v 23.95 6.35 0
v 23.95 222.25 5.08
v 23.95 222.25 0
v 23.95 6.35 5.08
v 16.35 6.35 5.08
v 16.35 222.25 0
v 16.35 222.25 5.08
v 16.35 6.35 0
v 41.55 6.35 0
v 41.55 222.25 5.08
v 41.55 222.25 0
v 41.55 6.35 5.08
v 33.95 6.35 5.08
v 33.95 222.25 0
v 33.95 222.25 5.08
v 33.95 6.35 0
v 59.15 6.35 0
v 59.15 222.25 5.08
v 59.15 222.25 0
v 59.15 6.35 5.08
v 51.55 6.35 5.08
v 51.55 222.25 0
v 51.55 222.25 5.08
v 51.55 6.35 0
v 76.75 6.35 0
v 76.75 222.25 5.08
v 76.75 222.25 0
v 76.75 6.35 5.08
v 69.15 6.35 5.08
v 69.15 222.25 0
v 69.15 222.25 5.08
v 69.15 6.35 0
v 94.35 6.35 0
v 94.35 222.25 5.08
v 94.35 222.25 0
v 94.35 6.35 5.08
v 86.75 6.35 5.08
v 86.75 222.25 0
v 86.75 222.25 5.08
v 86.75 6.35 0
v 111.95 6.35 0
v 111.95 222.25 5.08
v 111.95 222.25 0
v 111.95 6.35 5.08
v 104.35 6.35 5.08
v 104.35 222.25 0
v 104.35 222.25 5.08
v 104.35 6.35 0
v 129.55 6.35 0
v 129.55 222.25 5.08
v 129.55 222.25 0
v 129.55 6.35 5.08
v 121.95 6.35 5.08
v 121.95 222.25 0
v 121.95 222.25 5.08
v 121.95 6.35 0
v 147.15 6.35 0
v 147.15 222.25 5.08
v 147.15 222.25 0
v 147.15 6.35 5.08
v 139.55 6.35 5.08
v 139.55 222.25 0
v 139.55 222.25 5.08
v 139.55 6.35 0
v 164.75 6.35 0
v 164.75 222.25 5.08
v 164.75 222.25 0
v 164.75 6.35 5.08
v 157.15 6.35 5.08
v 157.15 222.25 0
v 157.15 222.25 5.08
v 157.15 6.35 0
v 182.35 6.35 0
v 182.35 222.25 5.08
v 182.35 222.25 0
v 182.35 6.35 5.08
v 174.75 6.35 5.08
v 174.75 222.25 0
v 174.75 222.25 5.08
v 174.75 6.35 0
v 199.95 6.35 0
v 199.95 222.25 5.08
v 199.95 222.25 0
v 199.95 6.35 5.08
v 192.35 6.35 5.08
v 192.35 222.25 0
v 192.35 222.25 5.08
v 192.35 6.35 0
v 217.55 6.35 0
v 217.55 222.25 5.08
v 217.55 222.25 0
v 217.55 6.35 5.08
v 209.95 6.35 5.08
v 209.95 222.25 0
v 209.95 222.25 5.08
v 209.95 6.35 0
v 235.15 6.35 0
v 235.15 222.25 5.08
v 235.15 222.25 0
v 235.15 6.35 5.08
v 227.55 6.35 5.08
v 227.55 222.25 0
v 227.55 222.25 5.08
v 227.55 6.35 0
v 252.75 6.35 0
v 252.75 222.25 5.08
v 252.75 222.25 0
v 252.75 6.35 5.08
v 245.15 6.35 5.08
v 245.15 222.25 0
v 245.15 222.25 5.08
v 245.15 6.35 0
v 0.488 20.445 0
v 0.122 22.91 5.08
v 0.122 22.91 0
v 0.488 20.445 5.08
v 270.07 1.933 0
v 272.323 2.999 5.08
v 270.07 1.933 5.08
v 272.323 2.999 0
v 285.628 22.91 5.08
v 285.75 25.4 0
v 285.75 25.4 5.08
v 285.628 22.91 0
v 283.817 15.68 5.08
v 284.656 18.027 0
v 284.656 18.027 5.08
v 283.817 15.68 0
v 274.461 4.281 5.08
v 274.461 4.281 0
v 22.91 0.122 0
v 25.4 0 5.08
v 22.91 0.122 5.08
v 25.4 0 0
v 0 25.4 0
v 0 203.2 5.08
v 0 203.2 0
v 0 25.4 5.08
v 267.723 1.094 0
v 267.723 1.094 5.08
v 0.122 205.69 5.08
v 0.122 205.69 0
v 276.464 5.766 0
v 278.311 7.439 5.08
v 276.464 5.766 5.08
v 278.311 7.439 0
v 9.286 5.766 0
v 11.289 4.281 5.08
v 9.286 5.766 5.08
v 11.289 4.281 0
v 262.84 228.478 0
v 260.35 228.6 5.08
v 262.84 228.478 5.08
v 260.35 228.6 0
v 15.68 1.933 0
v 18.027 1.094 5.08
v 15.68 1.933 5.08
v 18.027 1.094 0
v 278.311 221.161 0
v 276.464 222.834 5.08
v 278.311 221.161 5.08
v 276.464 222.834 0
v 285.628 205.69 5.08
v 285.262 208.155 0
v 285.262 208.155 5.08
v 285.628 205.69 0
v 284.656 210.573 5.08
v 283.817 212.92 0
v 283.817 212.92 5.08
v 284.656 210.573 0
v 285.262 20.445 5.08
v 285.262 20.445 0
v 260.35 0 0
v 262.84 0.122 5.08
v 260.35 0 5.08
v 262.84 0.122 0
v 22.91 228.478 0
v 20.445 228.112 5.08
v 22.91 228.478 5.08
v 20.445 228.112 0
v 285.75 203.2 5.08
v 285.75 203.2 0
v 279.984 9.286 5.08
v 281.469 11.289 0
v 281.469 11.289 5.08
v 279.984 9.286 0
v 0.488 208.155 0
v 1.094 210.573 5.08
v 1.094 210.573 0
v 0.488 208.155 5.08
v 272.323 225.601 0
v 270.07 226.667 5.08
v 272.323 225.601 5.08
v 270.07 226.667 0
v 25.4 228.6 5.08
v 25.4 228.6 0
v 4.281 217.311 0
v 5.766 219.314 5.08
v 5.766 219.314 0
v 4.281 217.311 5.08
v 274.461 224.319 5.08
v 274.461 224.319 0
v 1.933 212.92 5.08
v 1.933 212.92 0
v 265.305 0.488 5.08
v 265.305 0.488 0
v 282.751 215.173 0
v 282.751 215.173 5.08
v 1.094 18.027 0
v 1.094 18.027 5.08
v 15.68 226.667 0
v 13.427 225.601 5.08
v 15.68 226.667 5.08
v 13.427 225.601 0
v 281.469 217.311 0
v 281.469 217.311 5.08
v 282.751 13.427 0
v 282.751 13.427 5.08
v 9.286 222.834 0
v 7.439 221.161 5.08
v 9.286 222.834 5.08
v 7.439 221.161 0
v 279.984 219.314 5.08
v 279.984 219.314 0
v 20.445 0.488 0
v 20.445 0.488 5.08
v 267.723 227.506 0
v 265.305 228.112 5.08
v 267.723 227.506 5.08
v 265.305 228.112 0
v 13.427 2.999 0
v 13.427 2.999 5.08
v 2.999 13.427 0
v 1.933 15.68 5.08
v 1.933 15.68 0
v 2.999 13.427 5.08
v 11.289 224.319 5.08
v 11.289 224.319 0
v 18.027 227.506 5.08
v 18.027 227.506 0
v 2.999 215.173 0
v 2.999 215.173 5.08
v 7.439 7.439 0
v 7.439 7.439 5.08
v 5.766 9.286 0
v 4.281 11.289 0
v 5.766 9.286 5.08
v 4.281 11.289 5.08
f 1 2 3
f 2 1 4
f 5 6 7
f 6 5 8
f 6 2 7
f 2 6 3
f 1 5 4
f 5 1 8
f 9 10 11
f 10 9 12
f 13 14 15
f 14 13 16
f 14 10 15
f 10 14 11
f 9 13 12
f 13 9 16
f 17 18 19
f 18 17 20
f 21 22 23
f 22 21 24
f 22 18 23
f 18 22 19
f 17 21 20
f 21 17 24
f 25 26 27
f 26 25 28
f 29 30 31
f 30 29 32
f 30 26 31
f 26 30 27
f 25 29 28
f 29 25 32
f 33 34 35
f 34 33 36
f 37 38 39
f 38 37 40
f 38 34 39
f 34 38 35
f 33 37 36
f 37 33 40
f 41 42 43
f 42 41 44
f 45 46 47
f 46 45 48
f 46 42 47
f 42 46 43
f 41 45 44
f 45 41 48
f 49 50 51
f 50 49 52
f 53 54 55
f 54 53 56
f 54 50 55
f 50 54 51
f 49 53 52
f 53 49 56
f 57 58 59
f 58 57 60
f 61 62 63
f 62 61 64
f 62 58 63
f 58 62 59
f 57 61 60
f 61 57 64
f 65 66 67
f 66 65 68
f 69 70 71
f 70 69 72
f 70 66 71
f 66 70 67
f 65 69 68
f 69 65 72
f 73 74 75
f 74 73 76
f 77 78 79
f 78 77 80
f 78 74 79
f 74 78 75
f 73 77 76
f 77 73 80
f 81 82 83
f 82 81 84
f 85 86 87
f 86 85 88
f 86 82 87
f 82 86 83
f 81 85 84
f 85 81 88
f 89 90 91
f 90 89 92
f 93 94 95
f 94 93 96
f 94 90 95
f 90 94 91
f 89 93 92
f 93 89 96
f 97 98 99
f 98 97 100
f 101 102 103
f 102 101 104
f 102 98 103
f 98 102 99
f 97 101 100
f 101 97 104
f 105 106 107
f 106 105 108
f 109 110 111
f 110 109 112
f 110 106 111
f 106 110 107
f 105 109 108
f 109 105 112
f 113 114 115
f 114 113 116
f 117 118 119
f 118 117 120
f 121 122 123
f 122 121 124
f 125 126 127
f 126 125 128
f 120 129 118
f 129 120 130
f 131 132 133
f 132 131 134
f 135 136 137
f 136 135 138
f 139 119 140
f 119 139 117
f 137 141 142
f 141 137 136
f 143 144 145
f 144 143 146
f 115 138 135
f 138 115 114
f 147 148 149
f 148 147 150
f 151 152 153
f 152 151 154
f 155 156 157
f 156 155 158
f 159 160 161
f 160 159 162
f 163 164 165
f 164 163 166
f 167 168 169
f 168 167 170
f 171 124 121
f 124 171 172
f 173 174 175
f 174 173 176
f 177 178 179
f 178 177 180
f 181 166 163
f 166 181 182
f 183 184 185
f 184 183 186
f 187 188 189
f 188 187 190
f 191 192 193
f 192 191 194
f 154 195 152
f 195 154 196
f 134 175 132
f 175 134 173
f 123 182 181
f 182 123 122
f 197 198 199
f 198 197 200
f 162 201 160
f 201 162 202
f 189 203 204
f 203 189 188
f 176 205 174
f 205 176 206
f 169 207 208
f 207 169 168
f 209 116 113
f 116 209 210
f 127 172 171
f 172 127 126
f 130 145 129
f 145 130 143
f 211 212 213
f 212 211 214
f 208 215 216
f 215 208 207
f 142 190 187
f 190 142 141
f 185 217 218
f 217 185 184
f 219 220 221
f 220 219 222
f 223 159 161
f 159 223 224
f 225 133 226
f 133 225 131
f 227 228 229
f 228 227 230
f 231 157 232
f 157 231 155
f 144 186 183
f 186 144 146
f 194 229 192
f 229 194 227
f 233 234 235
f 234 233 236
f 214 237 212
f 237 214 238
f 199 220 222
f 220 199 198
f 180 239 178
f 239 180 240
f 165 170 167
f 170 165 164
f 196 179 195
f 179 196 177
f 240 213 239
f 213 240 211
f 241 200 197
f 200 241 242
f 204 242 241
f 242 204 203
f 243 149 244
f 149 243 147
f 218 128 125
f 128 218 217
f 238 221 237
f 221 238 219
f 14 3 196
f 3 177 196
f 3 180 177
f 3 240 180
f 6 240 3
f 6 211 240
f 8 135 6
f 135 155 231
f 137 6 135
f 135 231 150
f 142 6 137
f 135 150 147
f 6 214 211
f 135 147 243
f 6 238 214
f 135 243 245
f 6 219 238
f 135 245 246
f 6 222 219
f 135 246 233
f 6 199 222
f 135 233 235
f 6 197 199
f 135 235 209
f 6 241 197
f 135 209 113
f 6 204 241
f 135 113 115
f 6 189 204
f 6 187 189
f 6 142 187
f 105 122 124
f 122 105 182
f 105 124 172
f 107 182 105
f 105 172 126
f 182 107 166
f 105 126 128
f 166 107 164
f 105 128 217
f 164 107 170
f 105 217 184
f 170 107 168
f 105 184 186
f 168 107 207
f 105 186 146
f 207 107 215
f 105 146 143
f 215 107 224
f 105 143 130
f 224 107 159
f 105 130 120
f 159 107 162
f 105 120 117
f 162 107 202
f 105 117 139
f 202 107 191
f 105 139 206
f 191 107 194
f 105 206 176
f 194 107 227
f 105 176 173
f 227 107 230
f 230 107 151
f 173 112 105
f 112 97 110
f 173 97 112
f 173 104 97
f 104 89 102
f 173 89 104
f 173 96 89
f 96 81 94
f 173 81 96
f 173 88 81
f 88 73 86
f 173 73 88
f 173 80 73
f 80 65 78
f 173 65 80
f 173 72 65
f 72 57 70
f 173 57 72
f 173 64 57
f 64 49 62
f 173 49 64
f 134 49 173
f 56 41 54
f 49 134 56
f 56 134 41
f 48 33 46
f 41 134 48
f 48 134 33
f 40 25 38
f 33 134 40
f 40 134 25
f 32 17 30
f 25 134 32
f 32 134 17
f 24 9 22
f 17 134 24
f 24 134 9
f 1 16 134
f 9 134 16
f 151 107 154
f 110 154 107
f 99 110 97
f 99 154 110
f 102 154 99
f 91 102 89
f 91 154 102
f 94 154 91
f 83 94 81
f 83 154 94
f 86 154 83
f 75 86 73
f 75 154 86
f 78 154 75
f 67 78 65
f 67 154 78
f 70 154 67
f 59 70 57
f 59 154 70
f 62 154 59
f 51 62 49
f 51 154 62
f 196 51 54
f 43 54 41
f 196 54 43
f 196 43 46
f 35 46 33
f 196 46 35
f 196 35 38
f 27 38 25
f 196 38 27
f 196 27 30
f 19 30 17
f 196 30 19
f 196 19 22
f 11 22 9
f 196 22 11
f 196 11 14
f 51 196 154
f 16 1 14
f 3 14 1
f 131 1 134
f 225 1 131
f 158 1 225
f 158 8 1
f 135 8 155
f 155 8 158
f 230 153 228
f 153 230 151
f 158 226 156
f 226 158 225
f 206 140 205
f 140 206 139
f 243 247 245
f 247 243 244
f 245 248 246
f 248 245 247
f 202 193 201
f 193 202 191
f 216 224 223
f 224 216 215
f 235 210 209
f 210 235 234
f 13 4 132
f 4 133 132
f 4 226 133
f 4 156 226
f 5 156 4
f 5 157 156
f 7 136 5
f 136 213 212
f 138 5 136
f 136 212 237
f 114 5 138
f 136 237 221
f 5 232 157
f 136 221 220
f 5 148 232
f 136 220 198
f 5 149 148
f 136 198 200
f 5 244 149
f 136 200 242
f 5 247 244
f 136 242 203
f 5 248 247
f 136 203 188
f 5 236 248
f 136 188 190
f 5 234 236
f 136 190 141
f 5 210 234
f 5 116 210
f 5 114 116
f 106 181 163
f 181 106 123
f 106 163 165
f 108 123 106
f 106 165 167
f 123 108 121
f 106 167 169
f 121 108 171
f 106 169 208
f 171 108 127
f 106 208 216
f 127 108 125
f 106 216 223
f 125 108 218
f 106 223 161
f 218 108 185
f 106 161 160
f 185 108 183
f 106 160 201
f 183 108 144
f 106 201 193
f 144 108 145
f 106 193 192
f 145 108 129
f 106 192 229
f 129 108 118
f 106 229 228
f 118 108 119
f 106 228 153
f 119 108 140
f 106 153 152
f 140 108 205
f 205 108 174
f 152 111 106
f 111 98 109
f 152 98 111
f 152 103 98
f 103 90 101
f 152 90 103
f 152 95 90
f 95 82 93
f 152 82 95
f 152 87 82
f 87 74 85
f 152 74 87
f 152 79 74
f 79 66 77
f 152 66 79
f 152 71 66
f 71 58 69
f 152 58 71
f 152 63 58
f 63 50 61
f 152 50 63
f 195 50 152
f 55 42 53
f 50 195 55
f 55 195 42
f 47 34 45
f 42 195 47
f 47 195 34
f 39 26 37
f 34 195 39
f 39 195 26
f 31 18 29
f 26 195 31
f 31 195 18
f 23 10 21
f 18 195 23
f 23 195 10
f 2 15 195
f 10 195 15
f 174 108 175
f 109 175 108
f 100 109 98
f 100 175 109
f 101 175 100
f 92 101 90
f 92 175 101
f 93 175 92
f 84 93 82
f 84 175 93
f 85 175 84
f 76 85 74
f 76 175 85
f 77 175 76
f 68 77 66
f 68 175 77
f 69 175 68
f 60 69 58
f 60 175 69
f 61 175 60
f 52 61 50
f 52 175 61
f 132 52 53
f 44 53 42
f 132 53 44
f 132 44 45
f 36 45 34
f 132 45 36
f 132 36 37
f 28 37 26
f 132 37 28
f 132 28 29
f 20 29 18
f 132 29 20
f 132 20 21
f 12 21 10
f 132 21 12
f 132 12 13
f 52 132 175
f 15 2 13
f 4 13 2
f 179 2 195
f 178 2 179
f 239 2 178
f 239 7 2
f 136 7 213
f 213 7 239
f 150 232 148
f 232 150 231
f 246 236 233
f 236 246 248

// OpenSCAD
// file: model-forge/model-forge/tray.scad
// model-forge/tray.scad — rounded-corner outer panel with a recessed
// inset pocket (e.g. a "cooking dish" recess): a raised rim around the
// edge, floor thickness under the pocket, and an optional thin lip
// flange around the base — sized to slide into a support-rail groove
// (like the wooden rails inside the real Tiny Land oven cavity) rather
// than just resting loose.
//
//   use <model-forge/tray.scad>
//   rounded_tray(outer_width=285.75, outer_height=228.6, corner_radius=25.4,
//                floor_thickness=5.08, rim_height=3.81, inset_margin=6.35,
//                lip_width=3, lip_thickness=2);
//
// Shape: outer_width x outer_height slab, rounded corners (corner_radius),
// total height = floor_thickness + rim_height. A pocket is cut from the
// top, inset_margin in from every edge, cutting down through rim_height
// and stopping at floor_thickness from the bottom — so floor_thickness is
// what's left under the pocket, rim_height is how tall the surrounding
// wall stands above the pocket floor.
//
// The lip (lip_width/lip_thickness) is a thin flange at the TOP of the
// rim (from total_height-lip_thickness to total_height), sticking out
// lip_width beyond the main body on every side — corrected 2026-09-11
// per feedback on the real rail photo: the groove is near the top of the
// cavity wall, not the bottom. Both default to 0 (no lip) so existing
// calls keep working unchanged.

// hull-of-4-circles rounded rect — much faster to render than a
// minkowski-based approach for this shape (no minkowski sum needed).
module rounded_rect_2d(w, h, r) {
  hull() {
    translate([r, r]) circle(r = r, $fn = 64);
    translate([w - r, r]) circle(r = r, $fn = 64);
    translate([r, h - r]) circle(r = r, $fn = 64);
    translate([w - r, h - r]) circle(r = r, $fn = 64);
  }
}

module rounded_tray(
  outer_width,
  outer_height,
  corner_radius,
  floor_thickness,
  rim_height,
  inset_margin,
  lip_width = 0,
  lip_thickness = 0
) {
  total_height = floor_thickness + rim_height;

  union() {
    if (lip_width > 0 && lip_thickness > 0) {
      translate([-lip_width, -lip_width, total_height - lip_thickness])
        linear_extrude(height = lip_thickness)
          rounded_rect_2d(outer_width + 2 * lip_width, outer_height + 2 * lip_width, corner_radius + lip_width);
    }
    difference() {
      linear_extrude(height = total_height)
        rounded_rect_2d(outer_width, outer_height, corner_radius);
      translate([inset_margin, inset_margin, floor_thickness])
        cube([outer_width - 2 * inset_margin, outer_height - 2 * inset_margin, rim_height + 1]);
    }
  }
}
// file: model-forge/grate.scad
// model-forge/grate.scad — rounded-corner panel cut into an oven-rack-
// style bar grate: a solid frame border, parallel bars across the
// interior with open gaps between them.
//
//   use <model-forge/grate.scad>
//   oven_grate(outer_width=285.75, outer_height=228.6, corner_radius=25.4,
//              thickness=5.08, frame_width=6.35, bar_width=10, gap_width=7.6);
//
// Bars run parallel to the height (vertical bars spanning the width),
// starting and ending with a solid bar against the frame — real oven
// racks don't have a gap right at the edge. Spacing is pitch-based
// (bar_width + gap_width repeating); it won't divide the interior
// perfectly evenly on every size, so the last bar absorbs any leftover
// width. Tune bar_width/gap_width and re-render if that's visible.
use <model-forge/tray.scad> // rounded_rect_2d

module oven_grate(outer_width, outer_height, corner_radius, thickness, frame_width, bar_width, gap_width) {
  inner_width = outer_width - 2 * frame_width;
  inner_height = outer_height - 2 * frame_width;
  pitch = bar_width + gap_width;
  n_gaps = floor((inner_width - bar_width) / pitch);

  difference() {
    linear_extrude(height = thickness)
      rounded_rect_2d(outer_width, outer_height, corner_radius);
    for (i = [0 : n_gaps - 1]) {
      x = frame_width + bar_width + i * pitch;
      translate([x, frame_width, -1])
        cube([gap_width, inner_height, thickness + 2]);
    }
  }
}
// main file
// Tiny Land oven insert — grate/rack variant. Standalone, printable file.
// View > Show Customizer for sliders.
use <model-forge/grate.scad>

/* [Size — inches] */
outer_width_in  = 11.25;
outer_height_in = 9;
corner_radius_in = 1;

/* [Bars] */
thickness_mm   = 5.08; // [1:0.1:15]  settable independently of everything else
frame_width_mm = 6.35; // [2:0.5:20]  solid border
bar_width_mm   = 10;   // [3:0.5:30]  requested pitch — auto-fit keeps every bar this width
gap_width_mm   = 7.6;  // [2:0.5:20]  requested pitch — auto-fit tunes this slightly to divide evenly

/* [Lip — slides into the oven cavity's support-rail groove] */
lip_width_in     = 0.12; // [0:0.01:1]  long (top/bottom) edges
end_lip_width_in = 0.5;  // [0:0.01:1]  short (left/right) edges
lip_thickness_mm = 2.5;  // [0.5:0.1:3]  must be <=3mm to fit the real rail; 2.5mm is the sweet spot

IN_TO_MM = 25.4;

oven_grate(
  outer_width   = outer_width_in * IN_TO_MM,
  outer_height  = outer_height_in * IN_TO_MM,
  corner_radius = corner_radius_in * IN_TO_MM,
  thickness     = thickness_mm,
  frame_width   = frame_width_mm,
  bar_width     = bar_width_mm,
  gap_width     = gap_width_mm,
  lip_width     = lip_width_in * IN_TO_MM,
  end_lip_width = end_lip_width_in * IN_TO_MM,
  lip_thickness = lip_thickness_mm
);
